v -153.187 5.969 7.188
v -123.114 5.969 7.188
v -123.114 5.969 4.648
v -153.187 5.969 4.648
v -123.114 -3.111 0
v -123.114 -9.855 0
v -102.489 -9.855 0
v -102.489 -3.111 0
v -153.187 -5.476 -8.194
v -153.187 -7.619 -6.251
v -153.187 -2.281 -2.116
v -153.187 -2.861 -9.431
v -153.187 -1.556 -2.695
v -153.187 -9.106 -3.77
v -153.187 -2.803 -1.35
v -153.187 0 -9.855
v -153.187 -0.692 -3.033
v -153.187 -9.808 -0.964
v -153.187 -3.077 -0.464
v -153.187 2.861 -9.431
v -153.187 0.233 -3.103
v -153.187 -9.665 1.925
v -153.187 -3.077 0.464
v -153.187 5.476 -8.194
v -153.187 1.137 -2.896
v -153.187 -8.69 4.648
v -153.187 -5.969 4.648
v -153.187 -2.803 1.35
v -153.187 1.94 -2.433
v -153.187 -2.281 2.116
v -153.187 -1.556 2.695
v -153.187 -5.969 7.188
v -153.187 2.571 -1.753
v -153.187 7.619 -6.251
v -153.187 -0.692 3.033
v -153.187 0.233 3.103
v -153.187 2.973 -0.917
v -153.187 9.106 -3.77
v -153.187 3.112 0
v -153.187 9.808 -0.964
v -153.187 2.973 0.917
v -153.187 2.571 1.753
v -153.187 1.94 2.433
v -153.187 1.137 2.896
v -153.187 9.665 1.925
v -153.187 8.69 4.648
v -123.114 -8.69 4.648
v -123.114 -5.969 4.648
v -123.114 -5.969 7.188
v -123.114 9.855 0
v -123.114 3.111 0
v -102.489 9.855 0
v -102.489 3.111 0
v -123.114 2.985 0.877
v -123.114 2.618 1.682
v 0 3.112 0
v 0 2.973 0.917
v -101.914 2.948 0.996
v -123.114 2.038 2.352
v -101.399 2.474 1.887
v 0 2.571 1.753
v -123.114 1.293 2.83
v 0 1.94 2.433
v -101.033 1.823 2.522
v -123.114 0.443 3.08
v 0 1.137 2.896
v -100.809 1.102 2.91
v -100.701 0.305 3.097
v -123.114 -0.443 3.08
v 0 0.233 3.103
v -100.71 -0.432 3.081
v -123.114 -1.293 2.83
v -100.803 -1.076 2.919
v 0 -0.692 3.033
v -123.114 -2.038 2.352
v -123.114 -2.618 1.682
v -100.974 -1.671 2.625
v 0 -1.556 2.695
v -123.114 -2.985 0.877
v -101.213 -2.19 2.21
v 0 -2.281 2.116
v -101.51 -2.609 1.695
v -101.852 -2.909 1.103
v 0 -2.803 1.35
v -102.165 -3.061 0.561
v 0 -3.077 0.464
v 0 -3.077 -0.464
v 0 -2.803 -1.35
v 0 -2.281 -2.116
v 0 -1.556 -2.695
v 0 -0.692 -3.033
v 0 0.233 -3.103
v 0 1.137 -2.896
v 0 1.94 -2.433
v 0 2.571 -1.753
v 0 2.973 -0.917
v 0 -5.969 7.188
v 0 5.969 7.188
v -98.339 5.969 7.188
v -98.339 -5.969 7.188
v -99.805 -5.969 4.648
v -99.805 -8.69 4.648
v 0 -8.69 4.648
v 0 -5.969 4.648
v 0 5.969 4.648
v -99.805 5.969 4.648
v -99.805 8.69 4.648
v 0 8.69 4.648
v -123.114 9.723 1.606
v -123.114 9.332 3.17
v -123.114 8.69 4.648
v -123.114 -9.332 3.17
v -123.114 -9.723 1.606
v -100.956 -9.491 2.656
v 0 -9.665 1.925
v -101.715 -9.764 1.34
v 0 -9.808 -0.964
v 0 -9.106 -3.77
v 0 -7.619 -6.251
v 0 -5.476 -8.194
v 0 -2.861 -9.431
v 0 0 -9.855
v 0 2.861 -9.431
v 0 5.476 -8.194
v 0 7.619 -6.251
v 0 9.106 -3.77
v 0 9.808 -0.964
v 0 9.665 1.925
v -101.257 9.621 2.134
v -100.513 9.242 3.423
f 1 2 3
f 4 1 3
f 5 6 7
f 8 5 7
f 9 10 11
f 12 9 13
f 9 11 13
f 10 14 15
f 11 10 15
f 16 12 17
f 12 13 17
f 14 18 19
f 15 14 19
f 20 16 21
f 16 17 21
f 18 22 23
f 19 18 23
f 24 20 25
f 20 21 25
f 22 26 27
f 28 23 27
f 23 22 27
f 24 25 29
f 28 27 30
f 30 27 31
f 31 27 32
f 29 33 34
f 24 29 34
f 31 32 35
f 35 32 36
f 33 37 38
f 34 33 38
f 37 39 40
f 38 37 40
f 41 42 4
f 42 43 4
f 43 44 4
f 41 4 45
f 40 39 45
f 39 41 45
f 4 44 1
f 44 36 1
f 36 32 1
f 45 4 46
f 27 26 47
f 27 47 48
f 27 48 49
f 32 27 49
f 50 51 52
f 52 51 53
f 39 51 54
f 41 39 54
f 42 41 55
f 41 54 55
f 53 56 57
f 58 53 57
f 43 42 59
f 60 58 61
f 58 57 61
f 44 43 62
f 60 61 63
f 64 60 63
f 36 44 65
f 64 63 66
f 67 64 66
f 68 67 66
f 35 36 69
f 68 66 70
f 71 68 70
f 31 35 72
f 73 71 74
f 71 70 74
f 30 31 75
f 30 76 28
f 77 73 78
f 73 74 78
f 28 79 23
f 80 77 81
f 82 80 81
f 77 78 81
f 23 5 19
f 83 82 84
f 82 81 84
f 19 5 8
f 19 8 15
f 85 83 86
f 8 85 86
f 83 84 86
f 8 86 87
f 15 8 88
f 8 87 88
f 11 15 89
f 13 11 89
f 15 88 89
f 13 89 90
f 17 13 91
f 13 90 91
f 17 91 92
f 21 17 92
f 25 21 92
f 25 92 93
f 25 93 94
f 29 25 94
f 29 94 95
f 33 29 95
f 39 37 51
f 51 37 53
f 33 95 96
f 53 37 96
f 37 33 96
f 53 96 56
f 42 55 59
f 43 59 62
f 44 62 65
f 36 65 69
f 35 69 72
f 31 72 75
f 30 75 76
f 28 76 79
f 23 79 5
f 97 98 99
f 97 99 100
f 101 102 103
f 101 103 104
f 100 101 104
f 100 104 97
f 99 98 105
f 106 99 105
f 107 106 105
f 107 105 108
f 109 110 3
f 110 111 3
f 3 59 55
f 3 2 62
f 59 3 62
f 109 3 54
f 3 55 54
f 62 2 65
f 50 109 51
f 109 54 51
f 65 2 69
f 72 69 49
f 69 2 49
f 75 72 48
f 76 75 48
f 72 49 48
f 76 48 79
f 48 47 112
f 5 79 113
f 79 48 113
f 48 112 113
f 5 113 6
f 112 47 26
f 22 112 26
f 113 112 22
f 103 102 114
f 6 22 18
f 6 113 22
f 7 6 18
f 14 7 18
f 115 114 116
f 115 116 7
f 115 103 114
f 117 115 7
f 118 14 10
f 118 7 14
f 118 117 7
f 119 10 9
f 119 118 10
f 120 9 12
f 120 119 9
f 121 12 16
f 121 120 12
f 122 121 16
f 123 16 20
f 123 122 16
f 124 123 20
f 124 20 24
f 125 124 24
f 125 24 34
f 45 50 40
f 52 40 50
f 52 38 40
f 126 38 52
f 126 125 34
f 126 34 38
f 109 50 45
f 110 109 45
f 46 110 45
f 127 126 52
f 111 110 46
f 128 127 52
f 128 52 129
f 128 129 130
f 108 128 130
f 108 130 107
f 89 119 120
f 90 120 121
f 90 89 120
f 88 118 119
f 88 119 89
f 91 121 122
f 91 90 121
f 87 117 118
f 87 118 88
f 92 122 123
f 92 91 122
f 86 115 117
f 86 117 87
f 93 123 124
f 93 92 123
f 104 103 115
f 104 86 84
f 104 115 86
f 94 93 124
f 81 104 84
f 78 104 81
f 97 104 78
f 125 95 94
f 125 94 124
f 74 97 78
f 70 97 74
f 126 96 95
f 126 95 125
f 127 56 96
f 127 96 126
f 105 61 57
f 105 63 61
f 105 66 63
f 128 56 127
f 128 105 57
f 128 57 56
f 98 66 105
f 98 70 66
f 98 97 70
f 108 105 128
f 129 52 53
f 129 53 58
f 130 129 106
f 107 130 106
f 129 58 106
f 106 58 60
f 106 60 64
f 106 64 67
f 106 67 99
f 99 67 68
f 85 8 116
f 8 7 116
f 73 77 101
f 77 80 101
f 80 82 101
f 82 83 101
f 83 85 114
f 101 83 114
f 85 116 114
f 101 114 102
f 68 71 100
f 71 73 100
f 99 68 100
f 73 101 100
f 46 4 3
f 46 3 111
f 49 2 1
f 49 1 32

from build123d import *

# Parameters (mm, degrees)
F1_DEPTH = 153.1874
F3_DEPTH = 20.32
F4_R     = 3.1115
F5_DEPTH = 170.688
F7_DEPTH = 153.1884
F8_R     = 15.875
F9_DEPTH = 50.8


with BuildPart() as f1:
    # F0 (on Right) → F1 (new body)
    with BuildSketch(Plane.YZ):
        with BuildLine():
            Line((6.742013631, 7.1882), (-6.742013631, 7.1882))
            ThreePointArc((-6.742013631, 7.1882), (0, -9.8552), (6.742013631, 7.1882))
        make_face()
    extrude(amount=-F1_DEPTH)

    # F2 (on Front) → F3 (cut, symmetric)
    with BuildSketch(Plane.XZ):
        Polygon((-97.2876434091, 9.0090138838), (-123.1138, 9.0090138838), (-123.1138, 0), (-102.489, 0), align=None)
    extrude(amount=F3_DEPTH, both=True, mode=Mode.SUBTRACT)

    # F4 (on face) → F5 (cut)
    with BuildSketch(Plane.YZ):
        Circle(F4_R)
    extrude(amount=-F5_DEPTH, mode=Mode.SUBTRACT)

    # F6 (on face) → F7 (cut, through all)
    with BuildSketch(Plane.YZ):
        with BuildLine():
            Line((-5.969, 4.6482), (-5.969, 7.1882))
            Line((-5.969, 7.1882), (-6.742013631, 7.1882))
            ThreePointArc((-6.742013631, 7.1882), (-7.8199129874, 5.9978269323), (-8.6901785827, 4.6482))
            Line((-8.6901785827, 4.6482), (-5.969, 4.6482))
        make_face()
        with BuildLine():
            Line((5.969, 7.1882), (5.969, 4.6482))
            Line((5.969, 4.6482), (8.6901785827, 4.6482))
            ThreePointArc((8.6901785827, 4.6482), (7.8199129874, 5.9978269323), (6.742013631, 7.1882))
            Line((6.742013631, 7.1882), (5.969, 7.1882))
        make_face()
    extrude(amount=-F7_DEPTH, mode=Mode.SUBTRACT)


with BuildPart() as f9:
    # F8 (on face) → F9 (new body)
    with BuildSketch(Plane.YZ):
        Circle(F8_R)
        with BuildLine():
            Line((5.969, 7.1882), (5.969, 4.6482))
            Line((5.969, 4.6482), (8.6901785827, 4.6482))
            ThreePointArc((8.6901785827, 4.6482), (0, -9.8552), (-8.6901785827, 4.6482))
            Line((-8.6901785827, 4.6482), (-5.969, 4.6482))
            Line((-5.969, 4.6482), (-5.969, 7.1882))
            Line((-5.969, 7.1882), (5.969, 7.1882))
        make_face(mode=Mode.SUBTRACT)
    extrude(amount=F9_DEPTH)


solid = f1.part
